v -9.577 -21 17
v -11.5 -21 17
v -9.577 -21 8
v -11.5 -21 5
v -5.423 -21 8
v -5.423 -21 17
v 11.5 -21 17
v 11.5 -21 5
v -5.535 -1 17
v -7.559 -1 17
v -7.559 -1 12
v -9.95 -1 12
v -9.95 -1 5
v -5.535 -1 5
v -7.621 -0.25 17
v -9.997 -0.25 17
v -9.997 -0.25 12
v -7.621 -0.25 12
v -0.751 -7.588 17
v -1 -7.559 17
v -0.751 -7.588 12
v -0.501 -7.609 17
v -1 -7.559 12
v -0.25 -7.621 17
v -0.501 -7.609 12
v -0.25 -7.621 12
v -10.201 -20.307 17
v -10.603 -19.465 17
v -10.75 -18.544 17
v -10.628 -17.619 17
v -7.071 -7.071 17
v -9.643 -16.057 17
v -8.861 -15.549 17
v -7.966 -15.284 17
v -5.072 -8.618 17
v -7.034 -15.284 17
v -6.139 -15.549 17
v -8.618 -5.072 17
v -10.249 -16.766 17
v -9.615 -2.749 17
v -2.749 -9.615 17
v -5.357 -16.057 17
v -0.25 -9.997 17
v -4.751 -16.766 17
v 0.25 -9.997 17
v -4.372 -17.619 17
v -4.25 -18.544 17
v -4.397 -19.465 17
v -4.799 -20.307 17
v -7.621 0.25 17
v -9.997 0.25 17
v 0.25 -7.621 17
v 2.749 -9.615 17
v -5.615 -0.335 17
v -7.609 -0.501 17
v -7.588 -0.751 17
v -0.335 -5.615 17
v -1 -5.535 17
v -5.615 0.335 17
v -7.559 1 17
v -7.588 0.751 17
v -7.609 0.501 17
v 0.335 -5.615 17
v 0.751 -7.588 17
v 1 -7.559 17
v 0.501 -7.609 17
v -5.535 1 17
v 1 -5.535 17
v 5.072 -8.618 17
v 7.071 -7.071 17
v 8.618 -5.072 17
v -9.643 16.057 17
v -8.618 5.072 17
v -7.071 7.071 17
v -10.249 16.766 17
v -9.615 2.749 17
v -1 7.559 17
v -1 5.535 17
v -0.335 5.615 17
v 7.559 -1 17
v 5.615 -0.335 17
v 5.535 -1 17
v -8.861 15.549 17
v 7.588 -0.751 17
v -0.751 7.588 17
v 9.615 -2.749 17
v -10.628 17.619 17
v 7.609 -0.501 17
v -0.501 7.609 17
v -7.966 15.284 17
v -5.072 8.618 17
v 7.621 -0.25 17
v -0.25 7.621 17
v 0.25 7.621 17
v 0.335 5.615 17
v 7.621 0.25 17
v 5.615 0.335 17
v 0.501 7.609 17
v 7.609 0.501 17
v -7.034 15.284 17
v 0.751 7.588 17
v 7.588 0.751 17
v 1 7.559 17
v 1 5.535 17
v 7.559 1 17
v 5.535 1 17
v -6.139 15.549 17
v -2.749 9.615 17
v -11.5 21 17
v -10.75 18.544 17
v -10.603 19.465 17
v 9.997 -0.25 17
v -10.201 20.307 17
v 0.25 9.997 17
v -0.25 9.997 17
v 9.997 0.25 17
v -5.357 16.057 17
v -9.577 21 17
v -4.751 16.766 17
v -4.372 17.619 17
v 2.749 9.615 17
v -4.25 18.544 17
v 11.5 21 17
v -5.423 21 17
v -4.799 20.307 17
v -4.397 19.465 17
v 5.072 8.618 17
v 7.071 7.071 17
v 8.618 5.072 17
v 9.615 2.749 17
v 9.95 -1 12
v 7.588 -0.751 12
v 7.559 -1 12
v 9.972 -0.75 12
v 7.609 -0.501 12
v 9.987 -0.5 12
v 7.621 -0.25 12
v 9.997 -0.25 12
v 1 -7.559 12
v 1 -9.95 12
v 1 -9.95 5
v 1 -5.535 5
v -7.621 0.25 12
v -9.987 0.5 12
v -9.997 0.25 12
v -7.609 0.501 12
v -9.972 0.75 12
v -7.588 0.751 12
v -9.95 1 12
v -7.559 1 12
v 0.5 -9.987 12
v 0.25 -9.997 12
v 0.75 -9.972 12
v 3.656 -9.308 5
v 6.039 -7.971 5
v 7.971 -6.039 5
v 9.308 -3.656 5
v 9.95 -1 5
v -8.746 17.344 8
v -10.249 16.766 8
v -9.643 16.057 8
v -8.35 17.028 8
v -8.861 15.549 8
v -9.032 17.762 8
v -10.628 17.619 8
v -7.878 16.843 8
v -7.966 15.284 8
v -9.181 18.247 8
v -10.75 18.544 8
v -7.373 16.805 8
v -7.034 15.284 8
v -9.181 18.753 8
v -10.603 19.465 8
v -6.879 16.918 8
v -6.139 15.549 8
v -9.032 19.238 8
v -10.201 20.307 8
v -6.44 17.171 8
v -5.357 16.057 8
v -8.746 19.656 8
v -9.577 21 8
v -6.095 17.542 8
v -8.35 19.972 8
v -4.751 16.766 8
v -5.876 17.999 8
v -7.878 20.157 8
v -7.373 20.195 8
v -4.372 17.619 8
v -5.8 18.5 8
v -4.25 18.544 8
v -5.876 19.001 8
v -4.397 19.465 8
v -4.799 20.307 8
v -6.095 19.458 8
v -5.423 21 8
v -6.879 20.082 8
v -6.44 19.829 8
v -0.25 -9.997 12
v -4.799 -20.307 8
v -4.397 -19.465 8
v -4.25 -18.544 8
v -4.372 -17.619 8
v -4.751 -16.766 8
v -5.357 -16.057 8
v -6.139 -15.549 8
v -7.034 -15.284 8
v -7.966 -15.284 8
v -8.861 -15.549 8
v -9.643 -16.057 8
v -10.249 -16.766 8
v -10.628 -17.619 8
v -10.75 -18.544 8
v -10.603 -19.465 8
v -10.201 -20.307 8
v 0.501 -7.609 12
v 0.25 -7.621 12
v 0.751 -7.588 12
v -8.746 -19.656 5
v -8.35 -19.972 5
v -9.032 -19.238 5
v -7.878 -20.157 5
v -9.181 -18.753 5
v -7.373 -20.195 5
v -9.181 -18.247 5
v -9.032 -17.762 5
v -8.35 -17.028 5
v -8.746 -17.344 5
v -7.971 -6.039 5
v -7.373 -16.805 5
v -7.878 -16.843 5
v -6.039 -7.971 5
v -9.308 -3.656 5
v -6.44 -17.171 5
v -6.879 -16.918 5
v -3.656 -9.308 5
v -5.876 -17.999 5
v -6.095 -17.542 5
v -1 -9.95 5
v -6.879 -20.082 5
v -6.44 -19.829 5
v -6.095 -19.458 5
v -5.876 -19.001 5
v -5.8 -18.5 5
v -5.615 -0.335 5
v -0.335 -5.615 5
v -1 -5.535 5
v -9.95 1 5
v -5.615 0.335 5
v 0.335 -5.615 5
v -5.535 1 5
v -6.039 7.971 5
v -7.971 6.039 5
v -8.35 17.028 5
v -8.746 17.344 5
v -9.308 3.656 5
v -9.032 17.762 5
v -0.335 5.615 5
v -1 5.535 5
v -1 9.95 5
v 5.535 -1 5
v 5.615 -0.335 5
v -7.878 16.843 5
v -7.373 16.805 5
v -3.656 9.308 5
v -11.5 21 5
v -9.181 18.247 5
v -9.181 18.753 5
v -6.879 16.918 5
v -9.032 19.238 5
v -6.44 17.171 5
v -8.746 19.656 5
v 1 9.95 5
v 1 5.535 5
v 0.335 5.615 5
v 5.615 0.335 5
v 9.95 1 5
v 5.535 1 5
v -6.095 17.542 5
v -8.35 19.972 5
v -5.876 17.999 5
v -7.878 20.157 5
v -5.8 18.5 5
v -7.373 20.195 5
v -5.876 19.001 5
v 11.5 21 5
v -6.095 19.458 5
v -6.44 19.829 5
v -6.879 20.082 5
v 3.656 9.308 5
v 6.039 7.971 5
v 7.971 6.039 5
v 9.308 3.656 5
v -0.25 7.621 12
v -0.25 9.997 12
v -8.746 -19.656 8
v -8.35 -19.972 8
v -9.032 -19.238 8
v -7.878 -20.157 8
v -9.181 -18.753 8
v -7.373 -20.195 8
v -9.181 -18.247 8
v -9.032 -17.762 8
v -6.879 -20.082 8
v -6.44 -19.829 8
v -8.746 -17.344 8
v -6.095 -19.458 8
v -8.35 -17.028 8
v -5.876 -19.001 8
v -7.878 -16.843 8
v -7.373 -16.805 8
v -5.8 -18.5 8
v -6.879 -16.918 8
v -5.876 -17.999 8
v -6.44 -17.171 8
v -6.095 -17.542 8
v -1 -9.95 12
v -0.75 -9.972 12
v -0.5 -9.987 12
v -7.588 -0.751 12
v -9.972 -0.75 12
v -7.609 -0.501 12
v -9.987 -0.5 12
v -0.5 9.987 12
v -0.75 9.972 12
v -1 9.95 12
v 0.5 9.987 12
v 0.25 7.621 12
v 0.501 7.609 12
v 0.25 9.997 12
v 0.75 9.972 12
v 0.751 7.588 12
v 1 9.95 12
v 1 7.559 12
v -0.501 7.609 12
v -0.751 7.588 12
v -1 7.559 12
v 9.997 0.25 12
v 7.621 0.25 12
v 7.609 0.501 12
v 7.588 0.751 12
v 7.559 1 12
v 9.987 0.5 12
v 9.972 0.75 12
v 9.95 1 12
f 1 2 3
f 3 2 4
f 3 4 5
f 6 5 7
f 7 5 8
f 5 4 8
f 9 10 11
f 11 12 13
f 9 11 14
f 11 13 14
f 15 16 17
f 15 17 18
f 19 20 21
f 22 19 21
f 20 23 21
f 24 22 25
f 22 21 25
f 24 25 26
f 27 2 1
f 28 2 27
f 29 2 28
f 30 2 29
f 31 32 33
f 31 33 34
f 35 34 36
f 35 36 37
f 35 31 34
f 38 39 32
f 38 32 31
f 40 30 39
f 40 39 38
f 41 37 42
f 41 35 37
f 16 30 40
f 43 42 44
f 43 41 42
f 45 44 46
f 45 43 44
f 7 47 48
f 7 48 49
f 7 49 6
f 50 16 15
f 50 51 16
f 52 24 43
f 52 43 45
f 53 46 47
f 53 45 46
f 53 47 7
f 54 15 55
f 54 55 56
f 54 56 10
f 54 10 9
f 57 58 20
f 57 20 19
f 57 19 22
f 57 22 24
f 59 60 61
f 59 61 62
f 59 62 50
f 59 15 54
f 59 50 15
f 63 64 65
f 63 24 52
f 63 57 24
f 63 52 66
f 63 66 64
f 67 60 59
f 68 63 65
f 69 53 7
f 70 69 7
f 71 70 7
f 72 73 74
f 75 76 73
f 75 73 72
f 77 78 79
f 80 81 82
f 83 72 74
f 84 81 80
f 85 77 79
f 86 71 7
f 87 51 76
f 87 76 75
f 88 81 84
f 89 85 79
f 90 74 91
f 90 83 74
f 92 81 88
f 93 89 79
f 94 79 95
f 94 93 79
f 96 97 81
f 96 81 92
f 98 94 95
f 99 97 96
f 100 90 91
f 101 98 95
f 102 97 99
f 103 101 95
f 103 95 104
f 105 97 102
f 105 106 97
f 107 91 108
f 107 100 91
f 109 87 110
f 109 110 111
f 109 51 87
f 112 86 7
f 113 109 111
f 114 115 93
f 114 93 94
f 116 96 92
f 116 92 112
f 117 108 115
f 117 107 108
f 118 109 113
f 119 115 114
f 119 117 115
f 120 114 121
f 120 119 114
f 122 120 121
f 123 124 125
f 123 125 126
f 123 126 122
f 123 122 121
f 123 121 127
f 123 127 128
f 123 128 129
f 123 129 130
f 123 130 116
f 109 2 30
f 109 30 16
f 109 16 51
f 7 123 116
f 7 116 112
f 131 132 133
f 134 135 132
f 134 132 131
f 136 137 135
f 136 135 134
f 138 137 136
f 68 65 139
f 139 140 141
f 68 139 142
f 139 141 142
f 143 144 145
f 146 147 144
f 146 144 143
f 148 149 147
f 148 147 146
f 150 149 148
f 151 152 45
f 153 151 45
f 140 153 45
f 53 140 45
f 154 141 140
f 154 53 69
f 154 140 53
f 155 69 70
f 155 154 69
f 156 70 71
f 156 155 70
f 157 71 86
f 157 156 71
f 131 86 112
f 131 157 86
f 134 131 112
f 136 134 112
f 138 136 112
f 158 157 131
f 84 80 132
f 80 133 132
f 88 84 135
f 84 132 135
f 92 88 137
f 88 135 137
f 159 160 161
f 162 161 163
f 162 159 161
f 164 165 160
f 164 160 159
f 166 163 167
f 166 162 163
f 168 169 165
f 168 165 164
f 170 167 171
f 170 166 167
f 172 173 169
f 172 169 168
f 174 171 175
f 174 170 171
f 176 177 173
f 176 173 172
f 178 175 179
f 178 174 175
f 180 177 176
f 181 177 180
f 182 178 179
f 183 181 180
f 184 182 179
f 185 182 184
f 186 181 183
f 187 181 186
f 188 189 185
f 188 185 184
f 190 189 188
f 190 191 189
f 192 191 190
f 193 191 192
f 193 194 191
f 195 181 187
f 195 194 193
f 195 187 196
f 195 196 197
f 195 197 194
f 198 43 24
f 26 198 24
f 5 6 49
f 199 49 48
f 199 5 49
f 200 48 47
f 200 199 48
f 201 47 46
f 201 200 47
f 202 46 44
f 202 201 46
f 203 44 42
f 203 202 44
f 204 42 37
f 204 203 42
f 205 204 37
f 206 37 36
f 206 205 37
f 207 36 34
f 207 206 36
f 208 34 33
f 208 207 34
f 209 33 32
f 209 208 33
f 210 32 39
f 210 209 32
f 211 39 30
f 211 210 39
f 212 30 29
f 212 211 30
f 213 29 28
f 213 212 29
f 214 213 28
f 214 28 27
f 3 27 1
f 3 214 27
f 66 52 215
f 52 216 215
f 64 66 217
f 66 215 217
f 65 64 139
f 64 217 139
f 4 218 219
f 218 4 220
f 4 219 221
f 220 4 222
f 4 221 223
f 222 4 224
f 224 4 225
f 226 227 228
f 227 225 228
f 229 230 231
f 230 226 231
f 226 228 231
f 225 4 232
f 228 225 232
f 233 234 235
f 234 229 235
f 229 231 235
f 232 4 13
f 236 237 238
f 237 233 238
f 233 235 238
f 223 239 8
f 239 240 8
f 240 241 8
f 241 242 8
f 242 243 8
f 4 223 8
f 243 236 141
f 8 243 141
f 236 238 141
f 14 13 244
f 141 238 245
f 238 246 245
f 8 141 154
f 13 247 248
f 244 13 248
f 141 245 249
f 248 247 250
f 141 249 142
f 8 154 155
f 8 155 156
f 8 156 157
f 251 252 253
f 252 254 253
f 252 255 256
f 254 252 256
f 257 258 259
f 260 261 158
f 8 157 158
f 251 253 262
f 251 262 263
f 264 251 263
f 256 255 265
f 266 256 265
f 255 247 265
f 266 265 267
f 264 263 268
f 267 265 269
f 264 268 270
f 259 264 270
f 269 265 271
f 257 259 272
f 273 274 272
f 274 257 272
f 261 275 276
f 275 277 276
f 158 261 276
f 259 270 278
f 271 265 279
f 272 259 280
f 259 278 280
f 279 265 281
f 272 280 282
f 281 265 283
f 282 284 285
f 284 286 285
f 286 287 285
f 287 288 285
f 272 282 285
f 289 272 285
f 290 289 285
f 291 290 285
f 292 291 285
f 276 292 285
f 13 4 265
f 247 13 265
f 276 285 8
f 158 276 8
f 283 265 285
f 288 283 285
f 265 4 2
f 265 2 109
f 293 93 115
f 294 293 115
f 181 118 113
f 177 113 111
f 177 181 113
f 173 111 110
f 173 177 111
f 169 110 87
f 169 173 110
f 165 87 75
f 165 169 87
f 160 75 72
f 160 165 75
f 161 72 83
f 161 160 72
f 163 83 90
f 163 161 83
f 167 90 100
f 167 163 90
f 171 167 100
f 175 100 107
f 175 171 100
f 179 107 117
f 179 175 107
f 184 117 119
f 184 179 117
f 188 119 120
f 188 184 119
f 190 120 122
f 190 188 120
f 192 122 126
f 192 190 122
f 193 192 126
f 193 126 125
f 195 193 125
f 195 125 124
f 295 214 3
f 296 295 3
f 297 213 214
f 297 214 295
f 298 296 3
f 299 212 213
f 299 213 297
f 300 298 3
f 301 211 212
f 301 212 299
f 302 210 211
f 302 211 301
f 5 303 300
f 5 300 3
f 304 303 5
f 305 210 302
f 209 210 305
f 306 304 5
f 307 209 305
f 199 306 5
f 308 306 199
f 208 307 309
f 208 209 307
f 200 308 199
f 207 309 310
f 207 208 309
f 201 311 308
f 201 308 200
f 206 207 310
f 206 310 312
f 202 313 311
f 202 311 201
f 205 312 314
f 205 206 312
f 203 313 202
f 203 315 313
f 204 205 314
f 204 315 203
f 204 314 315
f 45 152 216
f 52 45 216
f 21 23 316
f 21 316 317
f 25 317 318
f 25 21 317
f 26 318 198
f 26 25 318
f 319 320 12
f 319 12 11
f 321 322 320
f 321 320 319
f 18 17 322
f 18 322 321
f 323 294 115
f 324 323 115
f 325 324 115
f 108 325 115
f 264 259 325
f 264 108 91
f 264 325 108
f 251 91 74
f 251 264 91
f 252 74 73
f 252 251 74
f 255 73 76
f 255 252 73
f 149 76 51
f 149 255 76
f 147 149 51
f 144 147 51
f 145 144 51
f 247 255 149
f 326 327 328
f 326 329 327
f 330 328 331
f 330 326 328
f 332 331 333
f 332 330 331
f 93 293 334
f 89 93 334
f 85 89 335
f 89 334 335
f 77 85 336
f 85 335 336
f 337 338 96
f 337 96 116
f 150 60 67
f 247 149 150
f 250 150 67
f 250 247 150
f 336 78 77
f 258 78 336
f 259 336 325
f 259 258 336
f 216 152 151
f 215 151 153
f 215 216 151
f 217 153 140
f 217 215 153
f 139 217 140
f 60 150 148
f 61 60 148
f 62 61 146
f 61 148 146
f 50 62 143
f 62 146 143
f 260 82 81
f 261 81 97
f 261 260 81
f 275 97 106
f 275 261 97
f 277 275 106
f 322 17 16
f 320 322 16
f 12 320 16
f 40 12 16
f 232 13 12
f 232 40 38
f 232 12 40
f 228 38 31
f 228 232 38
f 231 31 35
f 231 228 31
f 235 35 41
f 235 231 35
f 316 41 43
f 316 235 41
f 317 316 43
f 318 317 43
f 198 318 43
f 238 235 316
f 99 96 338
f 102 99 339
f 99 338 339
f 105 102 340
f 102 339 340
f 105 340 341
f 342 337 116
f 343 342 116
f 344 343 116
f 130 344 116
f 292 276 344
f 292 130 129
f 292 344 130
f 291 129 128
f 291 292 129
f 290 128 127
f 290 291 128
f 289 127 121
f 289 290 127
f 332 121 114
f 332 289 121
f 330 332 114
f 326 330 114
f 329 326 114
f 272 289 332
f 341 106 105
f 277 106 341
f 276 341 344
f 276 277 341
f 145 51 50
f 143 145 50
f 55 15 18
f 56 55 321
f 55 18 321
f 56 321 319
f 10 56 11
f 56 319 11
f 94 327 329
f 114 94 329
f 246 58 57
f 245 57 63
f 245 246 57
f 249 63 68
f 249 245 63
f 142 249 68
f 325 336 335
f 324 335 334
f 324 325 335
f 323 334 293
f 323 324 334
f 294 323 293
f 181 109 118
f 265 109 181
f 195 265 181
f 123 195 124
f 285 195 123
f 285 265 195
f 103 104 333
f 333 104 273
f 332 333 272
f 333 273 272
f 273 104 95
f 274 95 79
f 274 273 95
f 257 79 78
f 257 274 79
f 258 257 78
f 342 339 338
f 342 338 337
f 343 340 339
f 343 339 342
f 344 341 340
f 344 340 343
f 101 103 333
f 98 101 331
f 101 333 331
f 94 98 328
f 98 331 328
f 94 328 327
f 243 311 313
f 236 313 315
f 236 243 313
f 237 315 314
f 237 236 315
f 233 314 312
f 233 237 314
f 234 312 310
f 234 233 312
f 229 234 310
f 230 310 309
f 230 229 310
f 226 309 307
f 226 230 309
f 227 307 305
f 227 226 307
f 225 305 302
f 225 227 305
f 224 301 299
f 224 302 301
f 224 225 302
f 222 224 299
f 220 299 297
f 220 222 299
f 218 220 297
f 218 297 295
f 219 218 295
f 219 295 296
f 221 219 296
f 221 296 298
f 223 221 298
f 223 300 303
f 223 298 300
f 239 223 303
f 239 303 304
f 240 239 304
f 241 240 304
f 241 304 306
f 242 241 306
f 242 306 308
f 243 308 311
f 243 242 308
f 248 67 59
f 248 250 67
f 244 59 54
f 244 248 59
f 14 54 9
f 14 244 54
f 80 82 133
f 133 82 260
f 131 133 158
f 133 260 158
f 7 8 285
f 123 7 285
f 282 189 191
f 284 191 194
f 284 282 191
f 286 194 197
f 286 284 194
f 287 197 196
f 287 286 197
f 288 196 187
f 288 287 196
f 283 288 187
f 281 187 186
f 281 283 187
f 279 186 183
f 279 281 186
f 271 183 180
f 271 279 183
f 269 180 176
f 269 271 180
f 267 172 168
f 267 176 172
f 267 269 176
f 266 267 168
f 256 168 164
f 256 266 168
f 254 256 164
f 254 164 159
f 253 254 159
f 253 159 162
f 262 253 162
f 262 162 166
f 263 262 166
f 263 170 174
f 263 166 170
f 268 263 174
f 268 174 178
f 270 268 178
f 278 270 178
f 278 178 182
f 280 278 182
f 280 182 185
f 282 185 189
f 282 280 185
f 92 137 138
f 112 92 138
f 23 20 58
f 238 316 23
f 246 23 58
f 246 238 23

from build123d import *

# Parameters (mm, degrees)
BOX009_W                    = 20
BOX009_H                    = 2
BOX009_DEPTH                = 80
BOX010_W                    = 20
BOX010_H                    = 2
BOX010_DEPTH                = 80
COMPOUND004_PLACEMENT_ANGLE = 90
TUBE012_R                   = 10
TUBE012_R_2                 = 3.25
TUBE012_DEPTH               = 80
CYLINDER003_R               = 1.7
CYLINDER003_DEPTH           = 12
CYLINDER004_R               = 3.25
CYLINDER004_DEPTH           = 9
CYLINDER005_R               = 1.7
CYLINDER005_DEPTH           = 12
CYLINDER006_R               = 3.25
CYLINDER006_DEPTH           = 9
TUBE005_R                   = 7.625
TUBE005_R_2                 = 5.625
TUBE005_DEPTH               = 5
TUBE004_R                   = 7.625
TUBE004_R_2                 = 5.625
TUBE004_DEPTH               = 5
BOX003_W                    = 20
BOX003_H                    = 0.5
BOX003_DEPTH                = 40
BOX004_W                    = 20
BOX004_H                    = 0.5
BOX004_DEPTH                = 40
COMPOUND001_PLACEMENT_ANGLE = 90
TUBE003_R                   = 10
TUBE003_R_2                 = 3.25
TUBE003_DEPTH               = 40
CYLINDER_R                  = 5.625
CYLINDER_DEPTH              = 100
BOX002_W                    = 23
BOX002_H                    = 42
BOX002_DEPTH                = 12


with BuildPart() as cube009:
    # Box009 → Box009 (new body)
    with BuildSketch(Plane(origin=(-10, -1, -20), x_dir=(1, 0, 0), z_dir=(0, 0, 1))):
        with Locations((10, 1)):
            Rectangle(BOX009_W, BOX009_H)
    extrude(amount=BOX009_DEPTH)


with BuildPart() as fusion007:
    # Box010 → Box010 (new body)
    with BuildSketch(Plane(origin=(-10, -1, -20), x_dir=(1, 0, 0), z_dir=(0, 0, 1))):
        with Locations((10, 1)):
            Rectangle(BOX010_W, BOX010_H)
    extrude(amount=BOX010_DEPTH)


with BuildPart() as fusion007_1:
    # Compound004 placement: moved
    add(fusion007.part.rotate(Axis((0, 0, 0), (0, 0, 1)), COMPOUND004_PLACEMENT_ANGLE))

    # Fusion007: union Cube009
    add(cube009.part)


with BuildPart() as cut017:
    # Tube012 → Tube012 (new body)
    with BuildSketch(Plane.XY.offset(-20)):
        Circle(TUBE012_R)
        Circle(TUBE012_R_2, mode=Mode.SUBTRACT)
    extrude(amount=TUBE012_DEPTH)

    # Cut017: cut Fusion007
    add(fusion007_1.part, mode=Mode.SUBTRACT)


with BuildPart() as cylinder003:
    # Cylinder003 → Cylinder003 (new body)
    with BuildSketch(Plane.XY):
        Circle(CYLINDER003_R)
    extrude(amount=CYLINDER003_DEPTH)


with BuildPart() as fusion003:
    # Cylinder004 → Cylinder004 (new body)
    with BuildSketch(Plane.XY.offset(3)):
        Circle(CYLINDER004_R)
    extrude(amount=CYLINDER004_DEPTH)

    # Fusion003: union Cylinder003
    add(cylinder003.part)


with BuildPart() as fusion003_1:
    # Fusion003 placement: moved
    add(fusion003.part.moved(Location((-7.5, 18.5, 0))))


with BuildPart() as cylinder005:
    # Cylinder005 → Cylinder005 (new body)
    with BuildSketch(Plane.XY):
        Circle(CYLINDER005_R)
    extrude(amount=CYLINDER005_DEPTH)


with BuildPart() as fusion005:
    # Cylinder006 → Cylinder006 (new body)
    with BuildSketch(Plane.XY.offset(3)):
        Circle(CYLINDER006_R)
    extrude(amount=CYLINDER006_DEPTH)

    # Fusion004: union Cylinder005
    add(cylinder005.part)


with BuildPart() as fusion005_1:
    # Fusion004 placement: moved
    add(fusion005.part.moved(Location((-7.5, -18.5, 0))))

    # Fusion005: union Fusion003
    add(fusion003_1.part)


with BuildPart() as fusion005_2:
    # Fusion005 placement: moved
    add(fusion005_1.part.moved(Location((0, 0, 1))))


with BuildPart() as mountringgroove003:
    # Tube005 → Tube005 (new body)
    with BuildSketch(Plane.XY.offset(35)):
        Circle(TUBE005_R)
        Circle(TUBE005_R_2, mode=Mode.SUBTRACT)
    extrude(amount=TUBE005_DEPTH)


with BuildPart() as mountringgroove002:
    # Tube004 → Tube004 (new body)
    with BuildSketch(Plane.XY):
        Circle(TUBE004_R)
        Circle(TUBE004_R_2, mode=Mode.SUBTRACT)
    extrude(amount=TUBE004_DEPTH)


with BuildPart() as cube003:
    # Box003 → Box003 (new body)
    with BuildSketch(Plane(origin=(-10, -0.25, 0), x_dir=(1, 0, 0), z_dir=(0, 0, 1))):
        with Locations((10, 0.25)):
            Rectangle(BOX003_W, BOX003_H)
    extrude(amount=BOX003_DEPTH)


with BuildPart() as fusion001:
    # Box004 → Box004 (new body)
    with BuildSketch(Plane(origin=(-10, -0.25, 0), x_dir=(1, 0, 0), z_dir=(0, 0, 1))):
        with Locations((10, 0.25)):
            Rectangle(BOX004_W, BOX004_H)
    extrude(amount=BOX004_DEPTH)


with BuildPart() as fusion001_1:
    # Compound001 placement: moved
    add(fusion001.part.rotate(Axis((0, 0, 0), (0, 0, 1)), COMPOUND001_PLACEMENT_ANGLE))

    # Fusion001: union Cube003
    add(cube003.part)


with BuildPart() as cut006:
    # Tube003 → Tube003 (new body)
    with BuildSketch(Plane.XY):
        Circle(TUBE003_R)
        Circle(TUBE003_R_2, mode=Mode.SUBTRACT)
    extrude(amount=TUBE003_DEPTH)

    # Cut004: cut Fusion001
    add(fusion001_1.part, mode=Mode.SUBTRACT)

    # Cut005: cut MountringGroove002
    add(mountringgroove002.part, mode=Mode.SUBTRACT)

    # Cut006: cut MountringGroove003
    add(mountringgroove003.part, mode=Mode.SUBTRACT)


with BuildPart() as cut006_1:
    # Cut006 placement: moved
    add(cut006.part.moved(Location((0, 0, 7))))


with BuildPart() as cylinder:
    # Cylinder → Cylinder (new body)
    with BuildSketch(Plane.XY):
        Circle(CYLINDER_R)
    extrude(amount=CYLINDER_DEPTH)


with BuildPart() as bottommount:
    # Box002 → Box002 (new body)
    with BuildSketch(Plane(origin=(-11.5, -21, 0), x_dir=(1, 0, 0), z_dir=(0, 0, 1))):
        with Locations((11.5, 21)):
            Rectangle(BOX002_W, BOX002_H)
    extrude(amount=BOX002_DEPTH)

    # Cut003: cut Cylinder
    add(cylinder.part, mode=Mode.SUBTRACT)

    # Cut007: cut Cut006
    add(cut006_1.part, mode=Mode.SUBTRACT)


with BuildPart() as bottommount_1:
    # Cut007 placement: moved
    add(bottommount.part.moved(Location((0, 0, 1))))

    # Cut013: cut Fusion005
    add(fusion005_2.part, mode=Mode.SUBTRACT)


with BuildPart() as bottommount_2:
    # Cut013 placement: moved
    add(bottommount_1.part.moved(Location((0, 0, 4))))

    # Cut020: cut Cut017
    add(cut017.part, mode=Mode.SUBTRACT)


solid = bottommount_2.part
